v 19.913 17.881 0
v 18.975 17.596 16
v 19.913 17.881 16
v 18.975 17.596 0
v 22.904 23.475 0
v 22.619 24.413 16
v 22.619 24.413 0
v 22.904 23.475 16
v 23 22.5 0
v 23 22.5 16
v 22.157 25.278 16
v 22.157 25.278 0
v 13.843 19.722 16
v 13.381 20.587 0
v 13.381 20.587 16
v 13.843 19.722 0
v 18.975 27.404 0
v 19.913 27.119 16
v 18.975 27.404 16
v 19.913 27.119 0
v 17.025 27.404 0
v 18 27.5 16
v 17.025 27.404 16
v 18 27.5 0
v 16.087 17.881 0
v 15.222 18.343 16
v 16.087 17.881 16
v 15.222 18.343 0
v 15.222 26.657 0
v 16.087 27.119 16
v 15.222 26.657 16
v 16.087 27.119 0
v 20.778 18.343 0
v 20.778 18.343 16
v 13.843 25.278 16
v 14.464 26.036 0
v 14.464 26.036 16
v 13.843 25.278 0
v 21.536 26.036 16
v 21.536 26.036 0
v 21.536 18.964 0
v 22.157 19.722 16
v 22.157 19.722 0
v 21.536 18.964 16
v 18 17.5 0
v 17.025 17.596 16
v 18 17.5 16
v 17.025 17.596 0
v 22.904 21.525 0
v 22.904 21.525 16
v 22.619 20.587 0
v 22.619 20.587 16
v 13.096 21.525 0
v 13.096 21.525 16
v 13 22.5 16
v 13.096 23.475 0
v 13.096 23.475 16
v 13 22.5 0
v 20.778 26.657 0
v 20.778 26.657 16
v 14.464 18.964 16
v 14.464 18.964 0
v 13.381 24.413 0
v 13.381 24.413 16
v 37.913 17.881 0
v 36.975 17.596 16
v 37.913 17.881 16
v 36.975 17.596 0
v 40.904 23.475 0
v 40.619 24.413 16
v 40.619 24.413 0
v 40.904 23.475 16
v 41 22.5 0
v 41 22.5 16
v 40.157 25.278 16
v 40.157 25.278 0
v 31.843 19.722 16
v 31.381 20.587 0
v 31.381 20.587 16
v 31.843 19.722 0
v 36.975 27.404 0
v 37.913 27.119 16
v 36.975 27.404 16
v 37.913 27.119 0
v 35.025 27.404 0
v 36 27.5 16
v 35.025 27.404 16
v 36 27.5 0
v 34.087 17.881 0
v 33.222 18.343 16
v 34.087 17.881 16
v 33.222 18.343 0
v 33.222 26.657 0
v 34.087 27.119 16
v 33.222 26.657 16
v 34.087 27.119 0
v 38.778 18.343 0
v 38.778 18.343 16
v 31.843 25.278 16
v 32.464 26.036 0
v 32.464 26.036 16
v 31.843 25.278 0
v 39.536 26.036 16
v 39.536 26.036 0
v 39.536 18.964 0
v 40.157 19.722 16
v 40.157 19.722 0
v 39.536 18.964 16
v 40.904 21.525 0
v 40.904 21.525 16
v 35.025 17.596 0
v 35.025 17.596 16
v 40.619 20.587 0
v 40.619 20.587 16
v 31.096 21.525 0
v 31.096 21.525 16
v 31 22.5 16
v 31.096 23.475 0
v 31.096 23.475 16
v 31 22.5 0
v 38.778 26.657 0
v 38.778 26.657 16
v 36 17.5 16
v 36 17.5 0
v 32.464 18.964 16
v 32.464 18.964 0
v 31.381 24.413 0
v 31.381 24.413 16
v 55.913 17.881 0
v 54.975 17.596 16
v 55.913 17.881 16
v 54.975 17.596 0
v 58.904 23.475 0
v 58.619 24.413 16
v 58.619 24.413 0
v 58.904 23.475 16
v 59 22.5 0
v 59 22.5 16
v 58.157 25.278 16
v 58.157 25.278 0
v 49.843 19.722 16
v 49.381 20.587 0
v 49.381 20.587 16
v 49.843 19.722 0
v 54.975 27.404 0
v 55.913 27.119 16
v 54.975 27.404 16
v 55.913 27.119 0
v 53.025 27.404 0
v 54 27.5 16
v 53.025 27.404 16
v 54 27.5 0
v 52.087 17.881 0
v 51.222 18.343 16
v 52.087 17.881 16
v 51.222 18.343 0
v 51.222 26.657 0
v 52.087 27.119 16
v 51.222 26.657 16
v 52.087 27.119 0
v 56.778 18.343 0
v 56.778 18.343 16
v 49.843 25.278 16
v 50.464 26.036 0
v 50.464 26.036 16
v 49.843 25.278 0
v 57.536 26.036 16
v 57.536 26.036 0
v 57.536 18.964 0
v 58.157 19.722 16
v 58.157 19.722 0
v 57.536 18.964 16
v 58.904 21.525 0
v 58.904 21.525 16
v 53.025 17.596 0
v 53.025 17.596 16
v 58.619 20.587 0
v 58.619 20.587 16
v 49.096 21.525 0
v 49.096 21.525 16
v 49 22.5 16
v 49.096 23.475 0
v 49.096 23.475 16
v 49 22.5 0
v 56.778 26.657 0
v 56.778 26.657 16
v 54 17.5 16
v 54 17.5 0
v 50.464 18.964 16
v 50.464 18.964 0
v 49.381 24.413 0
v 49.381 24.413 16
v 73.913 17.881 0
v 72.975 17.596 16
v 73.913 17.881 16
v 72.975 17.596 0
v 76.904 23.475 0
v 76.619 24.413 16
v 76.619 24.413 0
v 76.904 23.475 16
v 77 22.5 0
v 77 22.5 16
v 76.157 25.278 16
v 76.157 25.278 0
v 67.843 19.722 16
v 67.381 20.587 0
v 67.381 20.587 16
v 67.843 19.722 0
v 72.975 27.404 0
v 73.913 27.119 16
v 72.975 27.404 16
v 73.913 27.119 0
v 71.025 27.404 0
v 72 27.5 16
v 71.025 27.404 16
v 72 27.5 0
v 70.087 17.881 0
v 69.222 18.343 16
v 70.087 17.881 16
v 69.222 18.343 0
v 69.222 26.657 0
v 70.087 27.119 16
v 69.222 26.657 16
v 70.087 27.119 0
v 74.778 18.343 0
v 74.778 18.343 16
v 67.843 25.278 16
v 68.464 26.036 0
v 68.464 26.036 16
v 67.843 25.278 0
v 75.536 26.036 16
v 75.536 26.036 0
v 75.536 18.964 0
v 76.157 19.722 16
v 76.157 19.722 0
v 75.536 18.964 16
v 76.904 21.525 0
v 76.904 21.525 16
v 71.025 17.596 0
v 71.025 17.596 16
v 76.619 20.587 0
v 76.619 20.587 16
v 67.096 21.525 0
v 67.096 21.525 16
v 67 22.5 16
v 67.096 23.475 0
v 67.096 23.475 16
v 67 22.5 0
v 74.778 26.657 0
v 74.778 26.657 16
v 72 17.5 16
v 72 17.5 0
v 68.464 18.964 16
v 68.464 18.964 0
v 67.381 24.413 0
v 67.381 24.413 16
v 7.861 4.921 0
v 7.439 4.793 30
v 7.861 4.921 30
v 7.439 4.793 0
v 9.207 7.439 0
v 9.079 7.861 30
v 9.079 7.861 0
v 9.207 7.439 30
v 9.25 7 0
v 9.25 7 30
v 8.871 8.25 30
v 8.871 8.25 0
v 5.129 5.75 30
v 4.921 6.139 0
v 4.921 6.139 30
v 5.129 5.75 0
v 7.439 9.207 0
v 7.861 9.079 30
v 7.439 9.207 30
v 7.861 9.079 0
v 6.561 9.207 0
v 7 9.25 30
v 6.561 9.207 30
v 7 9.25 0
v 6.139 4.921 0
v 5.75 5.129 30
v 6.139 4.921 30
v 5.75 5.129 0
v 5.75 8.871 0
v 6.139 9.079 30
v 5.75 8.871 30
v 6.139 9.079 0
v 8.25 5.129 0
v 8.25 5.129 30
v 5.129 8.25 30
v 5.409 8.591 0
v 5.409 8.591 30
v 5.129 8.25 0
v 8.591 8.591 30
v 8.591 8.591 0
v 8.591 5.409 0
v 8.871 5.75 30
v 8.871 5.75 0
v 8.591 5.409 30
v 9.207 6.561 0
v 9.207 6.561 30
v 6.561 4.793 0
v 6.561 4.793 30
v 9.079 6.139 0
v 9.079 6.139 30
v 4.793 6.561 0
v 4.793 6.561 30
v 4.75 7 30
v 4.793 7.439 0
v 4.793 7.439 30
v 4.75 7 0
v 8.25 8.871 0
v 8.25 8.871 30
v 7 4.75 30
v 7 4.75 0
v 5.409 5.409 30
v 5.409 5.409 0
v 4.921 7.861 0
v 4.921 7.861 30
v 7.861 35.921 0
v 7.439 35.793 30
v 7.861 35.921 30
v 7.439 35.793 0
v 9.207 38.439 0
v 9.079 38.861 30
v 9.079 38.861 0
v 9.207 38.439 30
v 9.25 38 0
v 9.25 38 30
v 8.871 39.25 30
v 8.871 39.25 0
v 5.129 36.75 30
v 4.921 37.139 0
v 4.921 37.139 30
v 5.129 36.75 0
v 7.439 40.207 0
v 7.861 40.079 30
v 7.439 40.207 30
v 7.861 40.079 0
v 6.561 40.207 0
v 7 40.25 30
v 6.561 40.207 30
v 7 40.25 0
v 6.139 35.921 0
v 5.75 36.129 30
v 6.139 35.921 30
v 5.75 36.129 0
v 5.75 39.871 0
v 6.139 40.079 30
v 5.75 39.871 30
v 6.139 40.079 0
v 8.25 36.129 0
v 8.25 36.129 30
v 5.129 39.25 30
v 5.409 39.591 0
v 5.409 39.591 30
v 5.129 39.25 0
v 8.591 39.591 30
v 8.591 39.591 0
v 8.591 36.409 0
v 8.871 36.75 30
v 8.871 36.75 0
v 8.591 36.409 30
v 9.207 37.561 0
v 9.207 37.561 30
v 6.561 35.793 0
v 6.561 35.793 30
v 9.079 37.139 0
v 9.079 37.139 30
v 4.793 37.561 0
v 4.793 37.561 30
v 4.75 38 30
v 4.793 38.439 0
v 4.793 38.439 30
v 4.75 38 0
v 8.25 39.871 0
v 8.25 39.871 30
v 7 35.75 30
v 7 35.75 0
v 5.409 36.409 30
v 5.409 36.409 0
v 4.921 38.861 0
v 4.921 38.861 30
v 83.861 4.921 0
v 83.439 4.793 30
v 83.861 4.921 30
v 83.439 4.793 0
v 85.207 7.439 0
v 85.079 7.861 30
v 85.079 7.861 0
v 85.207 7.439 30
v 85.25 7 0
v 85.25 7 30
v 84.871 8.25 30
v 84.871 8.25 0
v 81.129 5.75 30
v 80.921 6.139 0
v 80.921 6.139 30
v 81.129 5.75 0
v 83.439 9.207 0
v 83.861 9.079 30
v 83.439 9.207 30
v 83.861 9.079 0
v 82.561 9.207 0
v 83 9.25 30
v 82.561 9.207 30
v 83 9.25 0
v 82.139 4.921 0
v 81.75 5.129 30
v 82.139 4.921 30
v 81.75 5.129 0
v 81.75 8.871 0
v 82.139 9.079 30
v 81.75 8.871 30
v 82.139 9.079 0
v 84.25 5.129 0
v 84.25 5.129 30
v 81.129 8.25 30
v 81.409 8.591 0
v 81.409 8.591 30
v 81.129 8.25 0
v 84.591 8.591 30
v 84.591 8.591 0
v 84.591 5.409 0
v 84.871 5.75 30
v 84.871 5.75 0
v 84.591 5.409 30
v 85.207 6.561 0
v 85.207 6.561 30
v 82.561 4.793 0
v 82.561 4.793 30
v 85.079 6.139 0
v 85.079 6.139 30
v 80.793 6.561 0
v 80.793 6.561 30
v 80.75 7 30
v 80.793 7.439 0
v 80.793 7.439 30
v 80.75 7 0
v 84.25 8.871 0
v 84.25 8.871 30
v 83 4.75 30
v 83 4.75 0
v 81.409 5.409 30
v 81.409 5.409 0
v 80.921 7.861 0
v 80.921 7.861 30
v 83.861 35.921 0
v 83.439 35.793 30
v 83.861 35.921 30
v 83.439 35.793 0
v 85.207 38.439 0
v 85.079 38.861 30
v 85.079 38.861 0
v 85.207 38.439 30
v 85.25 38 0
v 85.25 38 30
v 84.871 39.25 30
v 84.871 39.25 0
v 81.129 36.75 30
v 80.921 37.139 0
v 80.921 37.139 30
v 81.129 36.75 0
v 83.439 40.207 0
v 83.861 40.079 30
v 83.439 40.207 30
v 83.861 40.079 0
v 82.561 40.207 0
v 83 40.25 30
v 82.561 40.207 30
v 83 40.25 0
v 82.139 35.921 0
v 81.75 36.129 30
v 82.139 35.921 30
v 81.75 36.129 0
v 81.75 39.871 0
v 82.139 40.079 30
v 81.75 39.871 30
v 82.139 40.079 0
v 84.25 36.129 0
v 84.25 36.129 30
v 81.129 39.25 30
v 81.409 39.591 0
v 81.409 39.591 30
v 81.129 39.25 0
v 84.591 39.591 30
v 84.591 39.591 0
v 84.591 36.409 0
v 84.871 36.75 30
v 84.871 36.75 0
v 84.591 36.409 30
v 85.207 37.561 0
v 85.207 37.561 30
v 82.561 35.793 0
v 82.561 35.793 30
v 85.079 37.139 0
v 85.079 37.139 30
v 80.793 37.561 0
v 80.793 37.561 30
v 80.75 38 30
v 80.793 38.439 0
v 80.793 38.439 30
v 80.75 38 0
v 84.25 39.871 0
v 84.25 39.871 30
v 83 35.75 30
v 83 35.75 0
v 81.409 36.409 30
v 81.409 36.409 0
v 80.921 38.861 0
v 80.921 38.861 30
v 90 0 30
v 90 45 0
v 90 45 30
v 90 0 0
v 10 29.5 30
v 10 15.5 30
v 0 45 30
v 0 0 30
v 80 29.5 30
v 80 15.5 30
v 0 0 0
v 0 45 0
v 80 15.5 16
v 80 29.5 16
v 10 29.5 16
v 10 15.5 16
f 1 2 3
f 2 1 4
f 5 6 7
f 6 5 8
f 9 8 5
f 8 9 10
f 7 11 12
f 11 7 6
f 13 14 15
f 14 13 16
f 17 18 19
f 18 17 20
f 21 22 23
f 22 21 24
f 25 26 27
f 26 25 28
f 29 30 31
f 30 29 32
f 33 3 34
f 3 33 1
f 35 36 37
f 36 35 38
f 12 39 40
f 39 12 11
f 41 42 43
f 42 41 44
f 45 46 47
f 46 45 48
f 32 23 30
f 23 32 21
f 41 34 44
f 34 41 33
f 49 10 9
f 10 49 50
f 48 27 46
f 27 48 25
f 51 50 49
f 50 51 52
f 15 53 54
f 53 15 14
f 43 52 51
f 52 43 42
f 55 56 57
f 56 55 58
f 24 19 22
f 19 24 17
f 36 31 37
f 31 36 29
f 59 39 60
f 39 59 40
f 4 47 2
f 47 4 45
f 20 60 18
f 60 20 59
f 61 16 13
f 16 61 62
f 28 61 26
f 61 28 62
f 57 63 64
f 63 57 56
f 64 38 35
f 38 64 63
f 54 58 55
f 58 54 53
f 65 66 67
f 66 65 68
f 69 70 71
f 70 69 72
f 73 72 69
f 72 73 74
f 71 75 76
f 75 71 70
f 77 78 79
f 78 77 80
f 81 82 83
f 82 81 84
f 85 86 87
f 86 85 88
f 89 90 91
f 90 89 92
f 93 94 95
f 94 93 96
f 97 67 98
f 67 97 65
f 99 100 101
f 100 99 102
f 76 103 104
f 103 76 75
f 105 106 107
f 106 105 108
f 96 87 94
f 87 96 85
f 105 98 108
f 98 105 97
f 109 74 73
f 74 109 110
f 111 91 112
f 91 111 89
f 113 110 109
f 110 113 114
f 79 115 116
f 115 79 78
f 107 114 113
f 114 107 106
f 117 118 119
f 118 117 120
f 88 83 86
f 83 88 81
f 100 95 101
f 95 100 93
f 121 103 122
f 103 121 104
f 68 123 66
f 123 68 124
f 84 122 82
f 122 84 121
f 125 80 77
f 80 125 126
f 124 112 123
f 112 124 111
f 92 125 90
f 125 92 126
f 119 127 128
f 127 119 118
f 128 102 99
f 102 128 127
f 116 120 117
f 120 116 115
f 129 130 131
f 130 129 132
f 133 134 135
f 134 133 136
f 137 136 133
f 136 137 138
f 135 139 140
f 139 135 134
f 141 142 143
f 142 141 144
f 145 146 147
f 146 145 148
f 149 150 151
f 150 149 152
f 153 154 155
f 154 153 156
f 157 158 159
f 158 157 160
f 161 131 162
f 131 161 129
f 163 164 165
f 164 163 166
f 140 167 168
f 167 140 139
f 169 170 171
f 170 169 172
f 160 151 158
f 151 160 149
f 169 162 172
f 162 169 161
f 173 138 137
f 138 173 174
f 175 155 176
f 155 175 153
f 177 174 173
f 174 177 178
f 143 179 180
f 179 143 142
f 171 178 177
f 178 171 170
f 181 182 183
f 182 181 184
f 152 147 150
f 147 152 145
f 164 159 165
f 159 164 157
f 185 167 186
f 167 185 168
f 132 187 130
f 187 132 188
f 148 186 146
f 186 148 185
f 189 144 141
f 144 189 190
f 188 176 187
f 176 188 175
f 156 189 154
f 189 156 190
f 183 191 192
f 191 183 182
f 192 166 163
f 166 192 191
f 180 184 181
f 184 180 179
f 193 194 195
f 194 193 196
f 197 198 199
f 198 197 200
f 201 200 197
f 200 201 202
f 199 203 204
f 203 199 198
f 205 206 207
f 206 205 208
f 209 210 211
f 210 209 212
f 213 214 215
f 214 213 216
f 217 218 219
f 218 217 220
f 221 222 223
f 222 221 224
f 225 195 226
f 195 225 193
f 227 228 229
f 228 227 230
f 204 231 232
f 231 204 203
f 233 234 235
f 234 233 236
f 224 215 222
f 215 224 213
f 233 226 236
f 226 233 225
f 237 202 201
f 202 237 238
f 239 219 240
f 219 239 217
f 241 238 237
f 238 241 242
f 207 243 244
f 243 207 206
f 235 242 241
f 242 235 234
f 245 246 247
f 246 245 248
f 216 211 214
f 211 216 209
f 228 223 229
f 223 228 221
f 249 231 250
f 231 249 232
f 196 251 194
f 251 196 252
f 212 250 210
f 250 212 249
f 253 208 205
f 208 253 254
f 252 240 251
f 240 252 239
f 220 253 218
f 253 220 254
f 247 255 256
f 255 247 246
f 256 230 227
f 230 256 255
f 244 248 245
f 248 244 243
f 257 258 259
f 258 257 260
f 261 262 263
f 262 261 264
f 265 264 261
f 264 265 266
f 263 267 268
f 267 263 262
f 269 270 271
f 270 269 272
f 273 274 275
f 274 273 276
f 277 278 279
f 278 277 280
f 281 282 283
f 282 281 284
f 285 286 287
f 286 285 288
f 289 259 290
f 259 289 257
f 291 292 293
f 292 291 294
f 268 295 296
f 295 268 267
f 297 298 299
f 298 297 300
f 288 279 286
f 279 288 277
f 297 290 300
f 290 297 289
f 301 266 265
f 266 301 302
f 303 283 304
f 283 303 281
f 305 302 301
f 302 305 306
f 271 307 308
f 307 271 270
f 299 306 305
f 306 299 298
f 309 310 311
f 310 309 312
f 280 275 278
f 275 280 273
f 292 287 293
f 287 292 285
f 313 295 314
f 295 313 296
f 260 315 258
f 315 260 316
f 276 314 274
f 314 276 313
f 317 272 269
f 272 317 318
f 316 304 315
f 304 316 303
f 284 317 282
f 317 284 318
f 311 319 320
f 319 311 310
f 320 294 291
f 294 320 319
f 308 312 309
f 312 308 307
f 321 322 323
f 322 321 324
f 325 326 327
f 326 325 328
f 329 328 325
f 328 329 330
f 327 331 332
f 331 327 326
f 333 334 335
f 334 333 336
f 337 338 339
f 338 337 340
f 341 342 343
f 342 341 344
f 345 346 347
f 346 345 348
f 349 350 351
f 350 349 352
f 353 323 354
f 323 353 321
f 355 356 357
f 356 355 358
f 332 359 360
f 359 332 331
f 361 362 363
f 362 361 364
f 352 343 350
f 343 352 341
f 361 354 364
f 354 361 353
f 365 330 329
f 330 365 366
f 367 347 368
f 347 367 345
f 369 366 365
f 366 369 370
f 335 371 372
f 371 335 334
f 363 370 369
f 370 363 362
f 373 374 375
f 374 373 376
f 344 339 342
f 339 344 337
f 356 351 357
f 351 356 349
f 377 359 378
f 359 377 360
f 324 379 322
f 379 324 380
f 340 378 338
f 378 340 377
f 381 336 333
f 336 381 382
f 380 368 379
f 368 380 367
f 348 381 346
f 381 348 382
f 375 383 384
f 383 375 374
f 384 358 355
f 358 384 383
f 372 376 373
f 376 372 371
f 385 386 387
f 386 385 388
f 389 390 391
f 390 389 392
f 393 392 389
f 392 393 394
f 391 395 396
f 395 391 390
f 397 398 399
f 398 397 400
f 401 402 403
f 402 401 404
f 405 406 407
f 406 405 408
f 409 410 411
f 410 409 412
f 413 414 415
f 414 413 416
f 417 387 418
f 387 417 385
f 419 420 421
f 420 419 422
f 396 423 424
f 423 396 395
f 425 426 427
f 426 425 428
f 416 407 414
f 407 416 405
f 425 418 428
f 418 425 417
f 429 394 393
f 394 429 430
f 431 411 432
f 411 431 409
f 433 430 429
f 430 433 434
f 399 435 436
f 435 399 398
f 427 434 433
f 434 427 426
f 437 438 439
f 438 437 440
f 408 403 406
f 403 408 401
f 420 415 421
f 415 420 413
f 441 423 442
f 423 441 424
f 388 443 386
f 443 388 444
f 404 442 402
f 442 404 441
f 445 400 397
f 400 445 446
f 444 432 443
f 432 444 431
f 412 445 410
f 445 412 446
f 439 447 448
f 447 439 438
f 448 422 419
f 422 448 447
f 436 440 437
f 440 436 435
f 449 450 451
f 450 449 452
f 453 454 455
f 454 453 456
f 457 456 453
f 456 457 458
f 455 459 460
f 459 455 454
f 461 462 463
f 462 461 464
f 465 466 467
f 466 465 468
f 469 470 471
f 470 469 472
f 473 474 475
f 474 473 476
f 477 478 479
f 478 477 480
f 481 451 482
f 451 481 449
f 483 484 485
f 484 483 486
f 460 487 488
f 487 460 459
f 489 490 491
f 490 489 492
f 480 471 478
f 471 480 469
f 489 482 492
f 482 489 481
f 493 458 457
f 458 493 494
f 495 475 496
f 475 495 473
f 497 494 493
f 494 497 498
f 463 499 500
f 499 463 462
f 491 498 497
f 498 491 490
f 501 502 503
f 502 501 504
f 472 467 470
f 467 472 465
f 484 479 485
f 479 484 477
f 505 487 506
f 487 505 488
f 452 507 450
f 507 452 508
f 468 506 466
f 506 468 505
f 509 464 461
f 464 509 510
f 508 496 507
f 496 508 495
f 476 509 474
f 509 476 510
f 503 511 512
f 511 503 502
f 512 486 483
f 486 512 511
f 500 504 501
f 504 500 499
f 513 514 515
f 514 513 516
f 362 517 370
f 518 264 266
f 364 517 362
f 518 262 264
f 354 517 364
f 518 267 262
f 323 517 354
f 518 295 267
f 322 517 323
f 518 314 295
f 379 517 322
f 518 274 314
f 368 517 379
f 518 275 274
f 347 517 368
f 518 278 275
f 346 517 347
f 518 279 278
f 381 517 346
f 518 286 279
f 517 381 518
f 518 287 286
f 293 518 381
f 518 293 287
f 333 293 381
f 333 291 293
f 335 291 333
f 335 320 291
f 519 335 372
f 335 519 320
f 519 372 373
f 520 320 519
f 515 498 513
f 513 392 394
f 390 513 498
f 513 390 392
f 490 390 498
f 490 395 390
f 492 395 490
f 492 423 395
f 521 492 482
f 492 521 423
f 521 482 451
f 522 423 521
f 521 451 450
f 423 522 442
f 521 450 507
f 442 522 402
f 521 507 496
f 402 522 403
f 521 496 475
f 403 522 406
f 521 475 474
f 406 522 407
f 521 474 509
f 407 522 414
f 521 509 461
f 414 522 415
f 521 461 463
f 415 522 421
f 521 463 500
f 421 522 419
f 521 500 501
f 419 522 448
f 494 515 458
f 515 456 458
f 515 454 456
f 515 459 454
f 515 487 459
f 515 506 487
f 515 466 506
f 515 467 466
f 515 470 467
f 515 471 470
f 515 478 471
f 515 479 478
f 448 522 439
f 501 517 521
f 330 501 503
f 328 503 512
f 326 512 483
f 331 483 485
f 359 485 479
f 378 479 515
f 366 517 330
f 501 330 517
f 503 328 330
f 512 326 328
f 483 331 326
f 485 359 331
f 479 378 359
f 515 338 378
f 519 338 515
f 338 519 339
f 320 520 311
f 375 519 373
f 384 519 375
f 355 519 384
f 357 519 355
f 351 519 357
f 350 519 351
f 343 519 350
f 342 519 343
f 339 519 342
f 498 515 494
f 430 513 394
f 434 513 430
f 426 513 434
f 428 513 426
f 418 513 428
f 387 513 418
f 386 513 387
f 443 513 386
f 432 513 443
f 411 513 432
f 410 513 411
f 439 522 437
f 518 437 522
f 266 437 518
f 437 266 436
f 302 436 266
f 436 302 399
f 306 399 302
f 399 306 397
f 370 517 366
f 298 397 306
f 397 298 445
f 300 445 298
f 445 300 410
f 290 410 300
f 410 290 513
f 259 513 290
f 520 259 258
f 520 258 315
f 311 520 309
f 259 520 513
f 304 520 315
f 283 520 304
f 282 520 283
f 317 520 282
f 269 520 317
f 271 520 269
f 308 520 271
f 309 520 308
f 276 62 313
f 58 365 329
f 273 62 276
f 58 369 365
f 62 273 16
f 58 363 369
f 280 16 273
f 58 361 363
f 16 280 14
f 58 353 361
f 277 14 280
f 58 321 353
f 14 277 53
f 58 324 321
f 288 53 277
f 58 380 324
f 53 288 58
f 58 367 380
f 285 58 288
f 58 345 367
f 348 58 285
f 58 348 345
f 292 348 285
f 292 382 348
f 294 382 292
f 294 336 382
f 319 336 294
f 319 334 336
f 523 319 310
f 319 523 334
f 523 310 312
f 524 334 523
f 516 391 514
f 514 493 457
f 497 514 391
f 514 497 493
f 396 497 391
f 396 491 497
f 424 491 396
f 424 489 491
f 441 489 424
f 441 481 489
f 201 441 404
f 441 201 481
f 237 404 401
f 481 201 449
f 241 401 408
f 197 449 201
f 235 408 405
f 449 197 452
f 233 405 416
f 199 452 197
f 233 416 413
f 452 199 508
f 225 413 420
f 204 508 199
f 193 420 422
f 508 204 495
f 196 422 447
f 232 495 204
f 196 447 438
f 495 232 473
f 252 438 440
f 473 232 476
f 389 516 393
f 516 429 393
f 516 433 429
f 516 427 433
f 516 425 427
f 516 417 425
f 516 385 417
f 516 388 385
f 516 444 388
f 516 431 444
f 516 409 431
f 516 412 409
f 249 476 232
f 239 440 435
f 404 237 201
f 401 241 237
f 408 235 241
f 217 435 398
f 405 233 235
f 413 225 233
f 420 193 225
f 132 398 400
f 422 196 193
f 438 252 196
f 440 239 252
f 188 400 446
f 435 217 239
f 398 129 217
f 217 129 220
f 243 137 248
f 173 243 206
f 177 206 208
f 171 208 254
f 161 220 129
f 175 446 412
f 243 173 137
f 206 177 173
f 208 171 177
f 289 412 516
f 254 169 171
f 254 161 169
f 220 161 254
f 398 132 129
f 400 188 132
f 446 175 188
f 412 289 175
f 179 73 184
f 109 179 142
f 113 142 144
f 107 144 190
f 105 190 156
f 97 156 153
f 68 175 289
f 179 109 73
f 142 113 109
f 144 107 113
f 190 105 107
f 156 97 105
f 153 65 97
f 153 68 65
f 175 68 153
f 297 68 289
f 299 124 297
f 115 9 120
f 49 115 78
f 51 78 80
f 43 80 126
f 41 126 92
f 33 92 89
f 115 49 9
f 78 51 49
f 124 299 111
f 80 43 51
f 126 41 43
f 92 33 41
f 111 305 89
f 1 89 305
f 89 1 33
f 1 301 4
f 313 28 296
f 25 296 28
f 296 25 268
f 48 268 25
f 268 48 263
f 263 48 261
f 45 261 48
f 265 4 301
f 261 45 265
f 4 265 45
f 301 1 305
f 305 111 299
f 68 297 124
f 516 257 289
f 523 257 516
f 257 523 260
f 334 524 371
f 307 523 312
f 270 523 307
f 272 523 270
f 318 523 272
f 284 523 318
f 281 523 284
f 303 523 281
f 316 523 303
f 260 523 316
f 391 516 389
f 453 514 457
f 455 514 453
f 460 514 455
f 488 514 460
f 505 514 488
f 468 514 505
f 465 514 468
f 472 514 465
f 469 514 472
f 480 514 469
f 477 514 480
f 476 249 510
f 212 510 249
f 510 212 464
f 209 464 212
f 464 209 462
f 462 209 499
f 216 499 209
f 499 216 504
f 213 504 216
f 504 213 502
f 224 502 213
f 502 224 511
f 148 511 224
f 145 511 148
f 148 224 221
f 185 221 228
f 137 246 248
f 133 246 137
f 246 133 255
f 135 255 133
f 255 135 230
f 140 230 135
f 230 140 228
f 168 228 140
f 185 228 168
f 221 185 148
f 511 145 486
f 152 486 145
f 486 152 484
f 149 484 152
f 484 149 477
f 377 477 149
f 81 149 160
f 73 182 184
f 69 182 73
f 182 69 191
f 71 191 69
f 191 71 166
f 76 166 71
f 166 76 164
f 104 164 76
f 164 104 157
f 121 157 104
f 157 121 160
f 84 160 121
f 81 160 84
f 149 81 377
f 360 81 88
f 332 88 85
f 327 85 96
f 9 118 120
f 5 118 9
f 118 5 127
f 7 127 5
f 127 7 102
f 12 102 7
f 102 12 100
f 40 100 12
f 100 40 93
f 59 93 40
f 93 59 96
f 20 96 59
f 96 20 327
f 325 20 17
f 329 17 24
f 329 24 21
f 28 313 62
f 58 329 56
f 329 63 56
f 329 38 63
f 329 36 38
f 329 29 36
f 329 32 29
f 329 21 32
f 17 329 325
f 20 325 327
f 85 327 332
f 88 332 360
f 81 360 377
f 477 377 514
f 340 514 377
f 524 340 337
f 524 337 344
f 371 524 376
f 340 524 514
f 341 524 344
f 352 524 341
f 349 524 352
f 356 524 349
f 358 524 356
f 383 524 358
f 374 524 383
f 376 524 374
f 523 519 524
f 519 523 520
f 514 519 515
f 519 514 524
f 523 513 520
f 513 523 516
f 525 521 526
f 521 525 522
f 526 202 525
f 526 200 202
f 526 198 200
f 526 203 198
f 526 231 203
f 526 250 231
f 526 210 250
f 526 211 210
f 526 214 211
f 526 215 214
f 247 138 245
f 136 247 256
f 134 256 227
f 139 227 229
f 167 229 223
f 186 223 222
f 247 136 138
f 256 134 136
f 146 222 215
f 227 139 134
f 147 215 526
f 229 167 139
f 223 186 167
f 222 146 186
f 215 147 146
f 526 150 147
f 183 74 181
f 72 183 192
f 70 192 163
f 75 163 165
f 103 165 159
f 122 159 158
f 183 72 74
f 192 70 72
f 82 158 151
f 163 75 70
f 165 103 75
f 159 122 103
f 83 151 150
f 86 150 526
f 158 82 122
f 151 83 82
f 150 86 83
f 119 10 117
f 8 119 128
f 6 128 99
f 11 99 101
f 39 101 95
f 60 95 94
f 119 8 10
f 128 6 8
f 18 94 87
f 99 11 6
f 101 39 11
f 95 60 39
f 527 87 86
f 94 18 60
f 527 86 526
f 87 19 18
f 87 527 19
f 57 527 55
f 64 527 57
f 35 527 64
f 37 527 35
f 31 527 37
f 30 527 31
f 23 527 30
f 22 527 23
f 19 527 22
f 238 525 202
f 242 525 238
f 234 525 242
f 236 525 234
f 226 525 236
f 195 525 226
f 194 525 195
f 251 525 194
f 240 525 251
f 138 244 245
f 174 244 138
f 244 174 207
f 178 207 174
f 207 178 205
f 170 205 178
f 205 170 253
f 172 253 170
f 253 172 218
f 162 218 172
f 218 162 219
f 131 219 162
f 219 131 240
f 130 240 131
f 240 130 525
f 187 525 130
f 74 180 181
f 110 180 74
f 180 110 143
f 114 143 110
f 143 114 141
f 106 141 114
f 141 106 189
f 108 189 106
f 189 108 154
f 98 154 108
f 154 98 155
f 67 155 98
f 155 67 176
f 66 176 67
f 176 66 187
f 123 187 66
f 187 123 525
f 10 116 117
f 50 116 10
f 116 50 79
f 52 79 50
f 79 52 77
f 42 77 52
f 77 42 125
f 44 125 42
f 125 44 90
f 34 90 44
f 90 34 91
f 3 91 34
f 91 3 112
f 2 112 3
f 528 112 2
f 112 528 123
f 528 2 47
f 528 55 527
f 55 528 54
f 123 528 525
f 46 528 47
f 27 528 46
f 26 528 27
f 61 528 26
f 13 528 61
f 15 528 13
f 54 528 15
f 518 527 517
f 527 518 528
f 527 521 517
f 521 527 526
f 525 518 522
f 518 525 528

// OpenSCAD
$fn = 32;

// ----------------------------------------------------------------------
// Manifold block: gallery_top manifold
// ----------------------------------------------------------------------

// --- parameters (mm) ---
block_l = 90;             // block length, X
block_w = 45;             // block width, Y
block_h = 30;             // block height, Z
port_d = 10;              // port bore diameter
port_pitch = 18;          // port pitch along X
gallery_d = 14;           // top gallery width, Y
gallery_depth = 14;       // gallery pocket depth
wall_p = 10;              // gallery end wall thickness, X
mnt_d = 4.5;              // mounting hole diameter
mnt_in = 7;               // mounting hole inset from the edges

n_ports = 4;  // ports in the row
port_x0 = (block_l - (n_ports - 1) * port_pitch) / 2;  // first port X

difference() {
  cube([block_l, block_w, block_h]);
  for (i = [0 : n_ports - 1])
    translate([port_x0 + i * port_pitch, block_w / 2, -1])
      cylinder(h = block_h + 2, d = port_d);
  translate([wall_p, block_w / 2 - gallery_d / 2, block_h - gallery_depth])
    cube([block_l - 2 * wall_p, gallery_d, gallery_depth + 1]);
  for (cx = [mnt_in, block_l - mnt_in])
    for (cy = [mnt_in, block_w - mnt_in])
      translate([cx, cy, -1]) cylinder(h = block_h + 2, d = mnt_d);
}
